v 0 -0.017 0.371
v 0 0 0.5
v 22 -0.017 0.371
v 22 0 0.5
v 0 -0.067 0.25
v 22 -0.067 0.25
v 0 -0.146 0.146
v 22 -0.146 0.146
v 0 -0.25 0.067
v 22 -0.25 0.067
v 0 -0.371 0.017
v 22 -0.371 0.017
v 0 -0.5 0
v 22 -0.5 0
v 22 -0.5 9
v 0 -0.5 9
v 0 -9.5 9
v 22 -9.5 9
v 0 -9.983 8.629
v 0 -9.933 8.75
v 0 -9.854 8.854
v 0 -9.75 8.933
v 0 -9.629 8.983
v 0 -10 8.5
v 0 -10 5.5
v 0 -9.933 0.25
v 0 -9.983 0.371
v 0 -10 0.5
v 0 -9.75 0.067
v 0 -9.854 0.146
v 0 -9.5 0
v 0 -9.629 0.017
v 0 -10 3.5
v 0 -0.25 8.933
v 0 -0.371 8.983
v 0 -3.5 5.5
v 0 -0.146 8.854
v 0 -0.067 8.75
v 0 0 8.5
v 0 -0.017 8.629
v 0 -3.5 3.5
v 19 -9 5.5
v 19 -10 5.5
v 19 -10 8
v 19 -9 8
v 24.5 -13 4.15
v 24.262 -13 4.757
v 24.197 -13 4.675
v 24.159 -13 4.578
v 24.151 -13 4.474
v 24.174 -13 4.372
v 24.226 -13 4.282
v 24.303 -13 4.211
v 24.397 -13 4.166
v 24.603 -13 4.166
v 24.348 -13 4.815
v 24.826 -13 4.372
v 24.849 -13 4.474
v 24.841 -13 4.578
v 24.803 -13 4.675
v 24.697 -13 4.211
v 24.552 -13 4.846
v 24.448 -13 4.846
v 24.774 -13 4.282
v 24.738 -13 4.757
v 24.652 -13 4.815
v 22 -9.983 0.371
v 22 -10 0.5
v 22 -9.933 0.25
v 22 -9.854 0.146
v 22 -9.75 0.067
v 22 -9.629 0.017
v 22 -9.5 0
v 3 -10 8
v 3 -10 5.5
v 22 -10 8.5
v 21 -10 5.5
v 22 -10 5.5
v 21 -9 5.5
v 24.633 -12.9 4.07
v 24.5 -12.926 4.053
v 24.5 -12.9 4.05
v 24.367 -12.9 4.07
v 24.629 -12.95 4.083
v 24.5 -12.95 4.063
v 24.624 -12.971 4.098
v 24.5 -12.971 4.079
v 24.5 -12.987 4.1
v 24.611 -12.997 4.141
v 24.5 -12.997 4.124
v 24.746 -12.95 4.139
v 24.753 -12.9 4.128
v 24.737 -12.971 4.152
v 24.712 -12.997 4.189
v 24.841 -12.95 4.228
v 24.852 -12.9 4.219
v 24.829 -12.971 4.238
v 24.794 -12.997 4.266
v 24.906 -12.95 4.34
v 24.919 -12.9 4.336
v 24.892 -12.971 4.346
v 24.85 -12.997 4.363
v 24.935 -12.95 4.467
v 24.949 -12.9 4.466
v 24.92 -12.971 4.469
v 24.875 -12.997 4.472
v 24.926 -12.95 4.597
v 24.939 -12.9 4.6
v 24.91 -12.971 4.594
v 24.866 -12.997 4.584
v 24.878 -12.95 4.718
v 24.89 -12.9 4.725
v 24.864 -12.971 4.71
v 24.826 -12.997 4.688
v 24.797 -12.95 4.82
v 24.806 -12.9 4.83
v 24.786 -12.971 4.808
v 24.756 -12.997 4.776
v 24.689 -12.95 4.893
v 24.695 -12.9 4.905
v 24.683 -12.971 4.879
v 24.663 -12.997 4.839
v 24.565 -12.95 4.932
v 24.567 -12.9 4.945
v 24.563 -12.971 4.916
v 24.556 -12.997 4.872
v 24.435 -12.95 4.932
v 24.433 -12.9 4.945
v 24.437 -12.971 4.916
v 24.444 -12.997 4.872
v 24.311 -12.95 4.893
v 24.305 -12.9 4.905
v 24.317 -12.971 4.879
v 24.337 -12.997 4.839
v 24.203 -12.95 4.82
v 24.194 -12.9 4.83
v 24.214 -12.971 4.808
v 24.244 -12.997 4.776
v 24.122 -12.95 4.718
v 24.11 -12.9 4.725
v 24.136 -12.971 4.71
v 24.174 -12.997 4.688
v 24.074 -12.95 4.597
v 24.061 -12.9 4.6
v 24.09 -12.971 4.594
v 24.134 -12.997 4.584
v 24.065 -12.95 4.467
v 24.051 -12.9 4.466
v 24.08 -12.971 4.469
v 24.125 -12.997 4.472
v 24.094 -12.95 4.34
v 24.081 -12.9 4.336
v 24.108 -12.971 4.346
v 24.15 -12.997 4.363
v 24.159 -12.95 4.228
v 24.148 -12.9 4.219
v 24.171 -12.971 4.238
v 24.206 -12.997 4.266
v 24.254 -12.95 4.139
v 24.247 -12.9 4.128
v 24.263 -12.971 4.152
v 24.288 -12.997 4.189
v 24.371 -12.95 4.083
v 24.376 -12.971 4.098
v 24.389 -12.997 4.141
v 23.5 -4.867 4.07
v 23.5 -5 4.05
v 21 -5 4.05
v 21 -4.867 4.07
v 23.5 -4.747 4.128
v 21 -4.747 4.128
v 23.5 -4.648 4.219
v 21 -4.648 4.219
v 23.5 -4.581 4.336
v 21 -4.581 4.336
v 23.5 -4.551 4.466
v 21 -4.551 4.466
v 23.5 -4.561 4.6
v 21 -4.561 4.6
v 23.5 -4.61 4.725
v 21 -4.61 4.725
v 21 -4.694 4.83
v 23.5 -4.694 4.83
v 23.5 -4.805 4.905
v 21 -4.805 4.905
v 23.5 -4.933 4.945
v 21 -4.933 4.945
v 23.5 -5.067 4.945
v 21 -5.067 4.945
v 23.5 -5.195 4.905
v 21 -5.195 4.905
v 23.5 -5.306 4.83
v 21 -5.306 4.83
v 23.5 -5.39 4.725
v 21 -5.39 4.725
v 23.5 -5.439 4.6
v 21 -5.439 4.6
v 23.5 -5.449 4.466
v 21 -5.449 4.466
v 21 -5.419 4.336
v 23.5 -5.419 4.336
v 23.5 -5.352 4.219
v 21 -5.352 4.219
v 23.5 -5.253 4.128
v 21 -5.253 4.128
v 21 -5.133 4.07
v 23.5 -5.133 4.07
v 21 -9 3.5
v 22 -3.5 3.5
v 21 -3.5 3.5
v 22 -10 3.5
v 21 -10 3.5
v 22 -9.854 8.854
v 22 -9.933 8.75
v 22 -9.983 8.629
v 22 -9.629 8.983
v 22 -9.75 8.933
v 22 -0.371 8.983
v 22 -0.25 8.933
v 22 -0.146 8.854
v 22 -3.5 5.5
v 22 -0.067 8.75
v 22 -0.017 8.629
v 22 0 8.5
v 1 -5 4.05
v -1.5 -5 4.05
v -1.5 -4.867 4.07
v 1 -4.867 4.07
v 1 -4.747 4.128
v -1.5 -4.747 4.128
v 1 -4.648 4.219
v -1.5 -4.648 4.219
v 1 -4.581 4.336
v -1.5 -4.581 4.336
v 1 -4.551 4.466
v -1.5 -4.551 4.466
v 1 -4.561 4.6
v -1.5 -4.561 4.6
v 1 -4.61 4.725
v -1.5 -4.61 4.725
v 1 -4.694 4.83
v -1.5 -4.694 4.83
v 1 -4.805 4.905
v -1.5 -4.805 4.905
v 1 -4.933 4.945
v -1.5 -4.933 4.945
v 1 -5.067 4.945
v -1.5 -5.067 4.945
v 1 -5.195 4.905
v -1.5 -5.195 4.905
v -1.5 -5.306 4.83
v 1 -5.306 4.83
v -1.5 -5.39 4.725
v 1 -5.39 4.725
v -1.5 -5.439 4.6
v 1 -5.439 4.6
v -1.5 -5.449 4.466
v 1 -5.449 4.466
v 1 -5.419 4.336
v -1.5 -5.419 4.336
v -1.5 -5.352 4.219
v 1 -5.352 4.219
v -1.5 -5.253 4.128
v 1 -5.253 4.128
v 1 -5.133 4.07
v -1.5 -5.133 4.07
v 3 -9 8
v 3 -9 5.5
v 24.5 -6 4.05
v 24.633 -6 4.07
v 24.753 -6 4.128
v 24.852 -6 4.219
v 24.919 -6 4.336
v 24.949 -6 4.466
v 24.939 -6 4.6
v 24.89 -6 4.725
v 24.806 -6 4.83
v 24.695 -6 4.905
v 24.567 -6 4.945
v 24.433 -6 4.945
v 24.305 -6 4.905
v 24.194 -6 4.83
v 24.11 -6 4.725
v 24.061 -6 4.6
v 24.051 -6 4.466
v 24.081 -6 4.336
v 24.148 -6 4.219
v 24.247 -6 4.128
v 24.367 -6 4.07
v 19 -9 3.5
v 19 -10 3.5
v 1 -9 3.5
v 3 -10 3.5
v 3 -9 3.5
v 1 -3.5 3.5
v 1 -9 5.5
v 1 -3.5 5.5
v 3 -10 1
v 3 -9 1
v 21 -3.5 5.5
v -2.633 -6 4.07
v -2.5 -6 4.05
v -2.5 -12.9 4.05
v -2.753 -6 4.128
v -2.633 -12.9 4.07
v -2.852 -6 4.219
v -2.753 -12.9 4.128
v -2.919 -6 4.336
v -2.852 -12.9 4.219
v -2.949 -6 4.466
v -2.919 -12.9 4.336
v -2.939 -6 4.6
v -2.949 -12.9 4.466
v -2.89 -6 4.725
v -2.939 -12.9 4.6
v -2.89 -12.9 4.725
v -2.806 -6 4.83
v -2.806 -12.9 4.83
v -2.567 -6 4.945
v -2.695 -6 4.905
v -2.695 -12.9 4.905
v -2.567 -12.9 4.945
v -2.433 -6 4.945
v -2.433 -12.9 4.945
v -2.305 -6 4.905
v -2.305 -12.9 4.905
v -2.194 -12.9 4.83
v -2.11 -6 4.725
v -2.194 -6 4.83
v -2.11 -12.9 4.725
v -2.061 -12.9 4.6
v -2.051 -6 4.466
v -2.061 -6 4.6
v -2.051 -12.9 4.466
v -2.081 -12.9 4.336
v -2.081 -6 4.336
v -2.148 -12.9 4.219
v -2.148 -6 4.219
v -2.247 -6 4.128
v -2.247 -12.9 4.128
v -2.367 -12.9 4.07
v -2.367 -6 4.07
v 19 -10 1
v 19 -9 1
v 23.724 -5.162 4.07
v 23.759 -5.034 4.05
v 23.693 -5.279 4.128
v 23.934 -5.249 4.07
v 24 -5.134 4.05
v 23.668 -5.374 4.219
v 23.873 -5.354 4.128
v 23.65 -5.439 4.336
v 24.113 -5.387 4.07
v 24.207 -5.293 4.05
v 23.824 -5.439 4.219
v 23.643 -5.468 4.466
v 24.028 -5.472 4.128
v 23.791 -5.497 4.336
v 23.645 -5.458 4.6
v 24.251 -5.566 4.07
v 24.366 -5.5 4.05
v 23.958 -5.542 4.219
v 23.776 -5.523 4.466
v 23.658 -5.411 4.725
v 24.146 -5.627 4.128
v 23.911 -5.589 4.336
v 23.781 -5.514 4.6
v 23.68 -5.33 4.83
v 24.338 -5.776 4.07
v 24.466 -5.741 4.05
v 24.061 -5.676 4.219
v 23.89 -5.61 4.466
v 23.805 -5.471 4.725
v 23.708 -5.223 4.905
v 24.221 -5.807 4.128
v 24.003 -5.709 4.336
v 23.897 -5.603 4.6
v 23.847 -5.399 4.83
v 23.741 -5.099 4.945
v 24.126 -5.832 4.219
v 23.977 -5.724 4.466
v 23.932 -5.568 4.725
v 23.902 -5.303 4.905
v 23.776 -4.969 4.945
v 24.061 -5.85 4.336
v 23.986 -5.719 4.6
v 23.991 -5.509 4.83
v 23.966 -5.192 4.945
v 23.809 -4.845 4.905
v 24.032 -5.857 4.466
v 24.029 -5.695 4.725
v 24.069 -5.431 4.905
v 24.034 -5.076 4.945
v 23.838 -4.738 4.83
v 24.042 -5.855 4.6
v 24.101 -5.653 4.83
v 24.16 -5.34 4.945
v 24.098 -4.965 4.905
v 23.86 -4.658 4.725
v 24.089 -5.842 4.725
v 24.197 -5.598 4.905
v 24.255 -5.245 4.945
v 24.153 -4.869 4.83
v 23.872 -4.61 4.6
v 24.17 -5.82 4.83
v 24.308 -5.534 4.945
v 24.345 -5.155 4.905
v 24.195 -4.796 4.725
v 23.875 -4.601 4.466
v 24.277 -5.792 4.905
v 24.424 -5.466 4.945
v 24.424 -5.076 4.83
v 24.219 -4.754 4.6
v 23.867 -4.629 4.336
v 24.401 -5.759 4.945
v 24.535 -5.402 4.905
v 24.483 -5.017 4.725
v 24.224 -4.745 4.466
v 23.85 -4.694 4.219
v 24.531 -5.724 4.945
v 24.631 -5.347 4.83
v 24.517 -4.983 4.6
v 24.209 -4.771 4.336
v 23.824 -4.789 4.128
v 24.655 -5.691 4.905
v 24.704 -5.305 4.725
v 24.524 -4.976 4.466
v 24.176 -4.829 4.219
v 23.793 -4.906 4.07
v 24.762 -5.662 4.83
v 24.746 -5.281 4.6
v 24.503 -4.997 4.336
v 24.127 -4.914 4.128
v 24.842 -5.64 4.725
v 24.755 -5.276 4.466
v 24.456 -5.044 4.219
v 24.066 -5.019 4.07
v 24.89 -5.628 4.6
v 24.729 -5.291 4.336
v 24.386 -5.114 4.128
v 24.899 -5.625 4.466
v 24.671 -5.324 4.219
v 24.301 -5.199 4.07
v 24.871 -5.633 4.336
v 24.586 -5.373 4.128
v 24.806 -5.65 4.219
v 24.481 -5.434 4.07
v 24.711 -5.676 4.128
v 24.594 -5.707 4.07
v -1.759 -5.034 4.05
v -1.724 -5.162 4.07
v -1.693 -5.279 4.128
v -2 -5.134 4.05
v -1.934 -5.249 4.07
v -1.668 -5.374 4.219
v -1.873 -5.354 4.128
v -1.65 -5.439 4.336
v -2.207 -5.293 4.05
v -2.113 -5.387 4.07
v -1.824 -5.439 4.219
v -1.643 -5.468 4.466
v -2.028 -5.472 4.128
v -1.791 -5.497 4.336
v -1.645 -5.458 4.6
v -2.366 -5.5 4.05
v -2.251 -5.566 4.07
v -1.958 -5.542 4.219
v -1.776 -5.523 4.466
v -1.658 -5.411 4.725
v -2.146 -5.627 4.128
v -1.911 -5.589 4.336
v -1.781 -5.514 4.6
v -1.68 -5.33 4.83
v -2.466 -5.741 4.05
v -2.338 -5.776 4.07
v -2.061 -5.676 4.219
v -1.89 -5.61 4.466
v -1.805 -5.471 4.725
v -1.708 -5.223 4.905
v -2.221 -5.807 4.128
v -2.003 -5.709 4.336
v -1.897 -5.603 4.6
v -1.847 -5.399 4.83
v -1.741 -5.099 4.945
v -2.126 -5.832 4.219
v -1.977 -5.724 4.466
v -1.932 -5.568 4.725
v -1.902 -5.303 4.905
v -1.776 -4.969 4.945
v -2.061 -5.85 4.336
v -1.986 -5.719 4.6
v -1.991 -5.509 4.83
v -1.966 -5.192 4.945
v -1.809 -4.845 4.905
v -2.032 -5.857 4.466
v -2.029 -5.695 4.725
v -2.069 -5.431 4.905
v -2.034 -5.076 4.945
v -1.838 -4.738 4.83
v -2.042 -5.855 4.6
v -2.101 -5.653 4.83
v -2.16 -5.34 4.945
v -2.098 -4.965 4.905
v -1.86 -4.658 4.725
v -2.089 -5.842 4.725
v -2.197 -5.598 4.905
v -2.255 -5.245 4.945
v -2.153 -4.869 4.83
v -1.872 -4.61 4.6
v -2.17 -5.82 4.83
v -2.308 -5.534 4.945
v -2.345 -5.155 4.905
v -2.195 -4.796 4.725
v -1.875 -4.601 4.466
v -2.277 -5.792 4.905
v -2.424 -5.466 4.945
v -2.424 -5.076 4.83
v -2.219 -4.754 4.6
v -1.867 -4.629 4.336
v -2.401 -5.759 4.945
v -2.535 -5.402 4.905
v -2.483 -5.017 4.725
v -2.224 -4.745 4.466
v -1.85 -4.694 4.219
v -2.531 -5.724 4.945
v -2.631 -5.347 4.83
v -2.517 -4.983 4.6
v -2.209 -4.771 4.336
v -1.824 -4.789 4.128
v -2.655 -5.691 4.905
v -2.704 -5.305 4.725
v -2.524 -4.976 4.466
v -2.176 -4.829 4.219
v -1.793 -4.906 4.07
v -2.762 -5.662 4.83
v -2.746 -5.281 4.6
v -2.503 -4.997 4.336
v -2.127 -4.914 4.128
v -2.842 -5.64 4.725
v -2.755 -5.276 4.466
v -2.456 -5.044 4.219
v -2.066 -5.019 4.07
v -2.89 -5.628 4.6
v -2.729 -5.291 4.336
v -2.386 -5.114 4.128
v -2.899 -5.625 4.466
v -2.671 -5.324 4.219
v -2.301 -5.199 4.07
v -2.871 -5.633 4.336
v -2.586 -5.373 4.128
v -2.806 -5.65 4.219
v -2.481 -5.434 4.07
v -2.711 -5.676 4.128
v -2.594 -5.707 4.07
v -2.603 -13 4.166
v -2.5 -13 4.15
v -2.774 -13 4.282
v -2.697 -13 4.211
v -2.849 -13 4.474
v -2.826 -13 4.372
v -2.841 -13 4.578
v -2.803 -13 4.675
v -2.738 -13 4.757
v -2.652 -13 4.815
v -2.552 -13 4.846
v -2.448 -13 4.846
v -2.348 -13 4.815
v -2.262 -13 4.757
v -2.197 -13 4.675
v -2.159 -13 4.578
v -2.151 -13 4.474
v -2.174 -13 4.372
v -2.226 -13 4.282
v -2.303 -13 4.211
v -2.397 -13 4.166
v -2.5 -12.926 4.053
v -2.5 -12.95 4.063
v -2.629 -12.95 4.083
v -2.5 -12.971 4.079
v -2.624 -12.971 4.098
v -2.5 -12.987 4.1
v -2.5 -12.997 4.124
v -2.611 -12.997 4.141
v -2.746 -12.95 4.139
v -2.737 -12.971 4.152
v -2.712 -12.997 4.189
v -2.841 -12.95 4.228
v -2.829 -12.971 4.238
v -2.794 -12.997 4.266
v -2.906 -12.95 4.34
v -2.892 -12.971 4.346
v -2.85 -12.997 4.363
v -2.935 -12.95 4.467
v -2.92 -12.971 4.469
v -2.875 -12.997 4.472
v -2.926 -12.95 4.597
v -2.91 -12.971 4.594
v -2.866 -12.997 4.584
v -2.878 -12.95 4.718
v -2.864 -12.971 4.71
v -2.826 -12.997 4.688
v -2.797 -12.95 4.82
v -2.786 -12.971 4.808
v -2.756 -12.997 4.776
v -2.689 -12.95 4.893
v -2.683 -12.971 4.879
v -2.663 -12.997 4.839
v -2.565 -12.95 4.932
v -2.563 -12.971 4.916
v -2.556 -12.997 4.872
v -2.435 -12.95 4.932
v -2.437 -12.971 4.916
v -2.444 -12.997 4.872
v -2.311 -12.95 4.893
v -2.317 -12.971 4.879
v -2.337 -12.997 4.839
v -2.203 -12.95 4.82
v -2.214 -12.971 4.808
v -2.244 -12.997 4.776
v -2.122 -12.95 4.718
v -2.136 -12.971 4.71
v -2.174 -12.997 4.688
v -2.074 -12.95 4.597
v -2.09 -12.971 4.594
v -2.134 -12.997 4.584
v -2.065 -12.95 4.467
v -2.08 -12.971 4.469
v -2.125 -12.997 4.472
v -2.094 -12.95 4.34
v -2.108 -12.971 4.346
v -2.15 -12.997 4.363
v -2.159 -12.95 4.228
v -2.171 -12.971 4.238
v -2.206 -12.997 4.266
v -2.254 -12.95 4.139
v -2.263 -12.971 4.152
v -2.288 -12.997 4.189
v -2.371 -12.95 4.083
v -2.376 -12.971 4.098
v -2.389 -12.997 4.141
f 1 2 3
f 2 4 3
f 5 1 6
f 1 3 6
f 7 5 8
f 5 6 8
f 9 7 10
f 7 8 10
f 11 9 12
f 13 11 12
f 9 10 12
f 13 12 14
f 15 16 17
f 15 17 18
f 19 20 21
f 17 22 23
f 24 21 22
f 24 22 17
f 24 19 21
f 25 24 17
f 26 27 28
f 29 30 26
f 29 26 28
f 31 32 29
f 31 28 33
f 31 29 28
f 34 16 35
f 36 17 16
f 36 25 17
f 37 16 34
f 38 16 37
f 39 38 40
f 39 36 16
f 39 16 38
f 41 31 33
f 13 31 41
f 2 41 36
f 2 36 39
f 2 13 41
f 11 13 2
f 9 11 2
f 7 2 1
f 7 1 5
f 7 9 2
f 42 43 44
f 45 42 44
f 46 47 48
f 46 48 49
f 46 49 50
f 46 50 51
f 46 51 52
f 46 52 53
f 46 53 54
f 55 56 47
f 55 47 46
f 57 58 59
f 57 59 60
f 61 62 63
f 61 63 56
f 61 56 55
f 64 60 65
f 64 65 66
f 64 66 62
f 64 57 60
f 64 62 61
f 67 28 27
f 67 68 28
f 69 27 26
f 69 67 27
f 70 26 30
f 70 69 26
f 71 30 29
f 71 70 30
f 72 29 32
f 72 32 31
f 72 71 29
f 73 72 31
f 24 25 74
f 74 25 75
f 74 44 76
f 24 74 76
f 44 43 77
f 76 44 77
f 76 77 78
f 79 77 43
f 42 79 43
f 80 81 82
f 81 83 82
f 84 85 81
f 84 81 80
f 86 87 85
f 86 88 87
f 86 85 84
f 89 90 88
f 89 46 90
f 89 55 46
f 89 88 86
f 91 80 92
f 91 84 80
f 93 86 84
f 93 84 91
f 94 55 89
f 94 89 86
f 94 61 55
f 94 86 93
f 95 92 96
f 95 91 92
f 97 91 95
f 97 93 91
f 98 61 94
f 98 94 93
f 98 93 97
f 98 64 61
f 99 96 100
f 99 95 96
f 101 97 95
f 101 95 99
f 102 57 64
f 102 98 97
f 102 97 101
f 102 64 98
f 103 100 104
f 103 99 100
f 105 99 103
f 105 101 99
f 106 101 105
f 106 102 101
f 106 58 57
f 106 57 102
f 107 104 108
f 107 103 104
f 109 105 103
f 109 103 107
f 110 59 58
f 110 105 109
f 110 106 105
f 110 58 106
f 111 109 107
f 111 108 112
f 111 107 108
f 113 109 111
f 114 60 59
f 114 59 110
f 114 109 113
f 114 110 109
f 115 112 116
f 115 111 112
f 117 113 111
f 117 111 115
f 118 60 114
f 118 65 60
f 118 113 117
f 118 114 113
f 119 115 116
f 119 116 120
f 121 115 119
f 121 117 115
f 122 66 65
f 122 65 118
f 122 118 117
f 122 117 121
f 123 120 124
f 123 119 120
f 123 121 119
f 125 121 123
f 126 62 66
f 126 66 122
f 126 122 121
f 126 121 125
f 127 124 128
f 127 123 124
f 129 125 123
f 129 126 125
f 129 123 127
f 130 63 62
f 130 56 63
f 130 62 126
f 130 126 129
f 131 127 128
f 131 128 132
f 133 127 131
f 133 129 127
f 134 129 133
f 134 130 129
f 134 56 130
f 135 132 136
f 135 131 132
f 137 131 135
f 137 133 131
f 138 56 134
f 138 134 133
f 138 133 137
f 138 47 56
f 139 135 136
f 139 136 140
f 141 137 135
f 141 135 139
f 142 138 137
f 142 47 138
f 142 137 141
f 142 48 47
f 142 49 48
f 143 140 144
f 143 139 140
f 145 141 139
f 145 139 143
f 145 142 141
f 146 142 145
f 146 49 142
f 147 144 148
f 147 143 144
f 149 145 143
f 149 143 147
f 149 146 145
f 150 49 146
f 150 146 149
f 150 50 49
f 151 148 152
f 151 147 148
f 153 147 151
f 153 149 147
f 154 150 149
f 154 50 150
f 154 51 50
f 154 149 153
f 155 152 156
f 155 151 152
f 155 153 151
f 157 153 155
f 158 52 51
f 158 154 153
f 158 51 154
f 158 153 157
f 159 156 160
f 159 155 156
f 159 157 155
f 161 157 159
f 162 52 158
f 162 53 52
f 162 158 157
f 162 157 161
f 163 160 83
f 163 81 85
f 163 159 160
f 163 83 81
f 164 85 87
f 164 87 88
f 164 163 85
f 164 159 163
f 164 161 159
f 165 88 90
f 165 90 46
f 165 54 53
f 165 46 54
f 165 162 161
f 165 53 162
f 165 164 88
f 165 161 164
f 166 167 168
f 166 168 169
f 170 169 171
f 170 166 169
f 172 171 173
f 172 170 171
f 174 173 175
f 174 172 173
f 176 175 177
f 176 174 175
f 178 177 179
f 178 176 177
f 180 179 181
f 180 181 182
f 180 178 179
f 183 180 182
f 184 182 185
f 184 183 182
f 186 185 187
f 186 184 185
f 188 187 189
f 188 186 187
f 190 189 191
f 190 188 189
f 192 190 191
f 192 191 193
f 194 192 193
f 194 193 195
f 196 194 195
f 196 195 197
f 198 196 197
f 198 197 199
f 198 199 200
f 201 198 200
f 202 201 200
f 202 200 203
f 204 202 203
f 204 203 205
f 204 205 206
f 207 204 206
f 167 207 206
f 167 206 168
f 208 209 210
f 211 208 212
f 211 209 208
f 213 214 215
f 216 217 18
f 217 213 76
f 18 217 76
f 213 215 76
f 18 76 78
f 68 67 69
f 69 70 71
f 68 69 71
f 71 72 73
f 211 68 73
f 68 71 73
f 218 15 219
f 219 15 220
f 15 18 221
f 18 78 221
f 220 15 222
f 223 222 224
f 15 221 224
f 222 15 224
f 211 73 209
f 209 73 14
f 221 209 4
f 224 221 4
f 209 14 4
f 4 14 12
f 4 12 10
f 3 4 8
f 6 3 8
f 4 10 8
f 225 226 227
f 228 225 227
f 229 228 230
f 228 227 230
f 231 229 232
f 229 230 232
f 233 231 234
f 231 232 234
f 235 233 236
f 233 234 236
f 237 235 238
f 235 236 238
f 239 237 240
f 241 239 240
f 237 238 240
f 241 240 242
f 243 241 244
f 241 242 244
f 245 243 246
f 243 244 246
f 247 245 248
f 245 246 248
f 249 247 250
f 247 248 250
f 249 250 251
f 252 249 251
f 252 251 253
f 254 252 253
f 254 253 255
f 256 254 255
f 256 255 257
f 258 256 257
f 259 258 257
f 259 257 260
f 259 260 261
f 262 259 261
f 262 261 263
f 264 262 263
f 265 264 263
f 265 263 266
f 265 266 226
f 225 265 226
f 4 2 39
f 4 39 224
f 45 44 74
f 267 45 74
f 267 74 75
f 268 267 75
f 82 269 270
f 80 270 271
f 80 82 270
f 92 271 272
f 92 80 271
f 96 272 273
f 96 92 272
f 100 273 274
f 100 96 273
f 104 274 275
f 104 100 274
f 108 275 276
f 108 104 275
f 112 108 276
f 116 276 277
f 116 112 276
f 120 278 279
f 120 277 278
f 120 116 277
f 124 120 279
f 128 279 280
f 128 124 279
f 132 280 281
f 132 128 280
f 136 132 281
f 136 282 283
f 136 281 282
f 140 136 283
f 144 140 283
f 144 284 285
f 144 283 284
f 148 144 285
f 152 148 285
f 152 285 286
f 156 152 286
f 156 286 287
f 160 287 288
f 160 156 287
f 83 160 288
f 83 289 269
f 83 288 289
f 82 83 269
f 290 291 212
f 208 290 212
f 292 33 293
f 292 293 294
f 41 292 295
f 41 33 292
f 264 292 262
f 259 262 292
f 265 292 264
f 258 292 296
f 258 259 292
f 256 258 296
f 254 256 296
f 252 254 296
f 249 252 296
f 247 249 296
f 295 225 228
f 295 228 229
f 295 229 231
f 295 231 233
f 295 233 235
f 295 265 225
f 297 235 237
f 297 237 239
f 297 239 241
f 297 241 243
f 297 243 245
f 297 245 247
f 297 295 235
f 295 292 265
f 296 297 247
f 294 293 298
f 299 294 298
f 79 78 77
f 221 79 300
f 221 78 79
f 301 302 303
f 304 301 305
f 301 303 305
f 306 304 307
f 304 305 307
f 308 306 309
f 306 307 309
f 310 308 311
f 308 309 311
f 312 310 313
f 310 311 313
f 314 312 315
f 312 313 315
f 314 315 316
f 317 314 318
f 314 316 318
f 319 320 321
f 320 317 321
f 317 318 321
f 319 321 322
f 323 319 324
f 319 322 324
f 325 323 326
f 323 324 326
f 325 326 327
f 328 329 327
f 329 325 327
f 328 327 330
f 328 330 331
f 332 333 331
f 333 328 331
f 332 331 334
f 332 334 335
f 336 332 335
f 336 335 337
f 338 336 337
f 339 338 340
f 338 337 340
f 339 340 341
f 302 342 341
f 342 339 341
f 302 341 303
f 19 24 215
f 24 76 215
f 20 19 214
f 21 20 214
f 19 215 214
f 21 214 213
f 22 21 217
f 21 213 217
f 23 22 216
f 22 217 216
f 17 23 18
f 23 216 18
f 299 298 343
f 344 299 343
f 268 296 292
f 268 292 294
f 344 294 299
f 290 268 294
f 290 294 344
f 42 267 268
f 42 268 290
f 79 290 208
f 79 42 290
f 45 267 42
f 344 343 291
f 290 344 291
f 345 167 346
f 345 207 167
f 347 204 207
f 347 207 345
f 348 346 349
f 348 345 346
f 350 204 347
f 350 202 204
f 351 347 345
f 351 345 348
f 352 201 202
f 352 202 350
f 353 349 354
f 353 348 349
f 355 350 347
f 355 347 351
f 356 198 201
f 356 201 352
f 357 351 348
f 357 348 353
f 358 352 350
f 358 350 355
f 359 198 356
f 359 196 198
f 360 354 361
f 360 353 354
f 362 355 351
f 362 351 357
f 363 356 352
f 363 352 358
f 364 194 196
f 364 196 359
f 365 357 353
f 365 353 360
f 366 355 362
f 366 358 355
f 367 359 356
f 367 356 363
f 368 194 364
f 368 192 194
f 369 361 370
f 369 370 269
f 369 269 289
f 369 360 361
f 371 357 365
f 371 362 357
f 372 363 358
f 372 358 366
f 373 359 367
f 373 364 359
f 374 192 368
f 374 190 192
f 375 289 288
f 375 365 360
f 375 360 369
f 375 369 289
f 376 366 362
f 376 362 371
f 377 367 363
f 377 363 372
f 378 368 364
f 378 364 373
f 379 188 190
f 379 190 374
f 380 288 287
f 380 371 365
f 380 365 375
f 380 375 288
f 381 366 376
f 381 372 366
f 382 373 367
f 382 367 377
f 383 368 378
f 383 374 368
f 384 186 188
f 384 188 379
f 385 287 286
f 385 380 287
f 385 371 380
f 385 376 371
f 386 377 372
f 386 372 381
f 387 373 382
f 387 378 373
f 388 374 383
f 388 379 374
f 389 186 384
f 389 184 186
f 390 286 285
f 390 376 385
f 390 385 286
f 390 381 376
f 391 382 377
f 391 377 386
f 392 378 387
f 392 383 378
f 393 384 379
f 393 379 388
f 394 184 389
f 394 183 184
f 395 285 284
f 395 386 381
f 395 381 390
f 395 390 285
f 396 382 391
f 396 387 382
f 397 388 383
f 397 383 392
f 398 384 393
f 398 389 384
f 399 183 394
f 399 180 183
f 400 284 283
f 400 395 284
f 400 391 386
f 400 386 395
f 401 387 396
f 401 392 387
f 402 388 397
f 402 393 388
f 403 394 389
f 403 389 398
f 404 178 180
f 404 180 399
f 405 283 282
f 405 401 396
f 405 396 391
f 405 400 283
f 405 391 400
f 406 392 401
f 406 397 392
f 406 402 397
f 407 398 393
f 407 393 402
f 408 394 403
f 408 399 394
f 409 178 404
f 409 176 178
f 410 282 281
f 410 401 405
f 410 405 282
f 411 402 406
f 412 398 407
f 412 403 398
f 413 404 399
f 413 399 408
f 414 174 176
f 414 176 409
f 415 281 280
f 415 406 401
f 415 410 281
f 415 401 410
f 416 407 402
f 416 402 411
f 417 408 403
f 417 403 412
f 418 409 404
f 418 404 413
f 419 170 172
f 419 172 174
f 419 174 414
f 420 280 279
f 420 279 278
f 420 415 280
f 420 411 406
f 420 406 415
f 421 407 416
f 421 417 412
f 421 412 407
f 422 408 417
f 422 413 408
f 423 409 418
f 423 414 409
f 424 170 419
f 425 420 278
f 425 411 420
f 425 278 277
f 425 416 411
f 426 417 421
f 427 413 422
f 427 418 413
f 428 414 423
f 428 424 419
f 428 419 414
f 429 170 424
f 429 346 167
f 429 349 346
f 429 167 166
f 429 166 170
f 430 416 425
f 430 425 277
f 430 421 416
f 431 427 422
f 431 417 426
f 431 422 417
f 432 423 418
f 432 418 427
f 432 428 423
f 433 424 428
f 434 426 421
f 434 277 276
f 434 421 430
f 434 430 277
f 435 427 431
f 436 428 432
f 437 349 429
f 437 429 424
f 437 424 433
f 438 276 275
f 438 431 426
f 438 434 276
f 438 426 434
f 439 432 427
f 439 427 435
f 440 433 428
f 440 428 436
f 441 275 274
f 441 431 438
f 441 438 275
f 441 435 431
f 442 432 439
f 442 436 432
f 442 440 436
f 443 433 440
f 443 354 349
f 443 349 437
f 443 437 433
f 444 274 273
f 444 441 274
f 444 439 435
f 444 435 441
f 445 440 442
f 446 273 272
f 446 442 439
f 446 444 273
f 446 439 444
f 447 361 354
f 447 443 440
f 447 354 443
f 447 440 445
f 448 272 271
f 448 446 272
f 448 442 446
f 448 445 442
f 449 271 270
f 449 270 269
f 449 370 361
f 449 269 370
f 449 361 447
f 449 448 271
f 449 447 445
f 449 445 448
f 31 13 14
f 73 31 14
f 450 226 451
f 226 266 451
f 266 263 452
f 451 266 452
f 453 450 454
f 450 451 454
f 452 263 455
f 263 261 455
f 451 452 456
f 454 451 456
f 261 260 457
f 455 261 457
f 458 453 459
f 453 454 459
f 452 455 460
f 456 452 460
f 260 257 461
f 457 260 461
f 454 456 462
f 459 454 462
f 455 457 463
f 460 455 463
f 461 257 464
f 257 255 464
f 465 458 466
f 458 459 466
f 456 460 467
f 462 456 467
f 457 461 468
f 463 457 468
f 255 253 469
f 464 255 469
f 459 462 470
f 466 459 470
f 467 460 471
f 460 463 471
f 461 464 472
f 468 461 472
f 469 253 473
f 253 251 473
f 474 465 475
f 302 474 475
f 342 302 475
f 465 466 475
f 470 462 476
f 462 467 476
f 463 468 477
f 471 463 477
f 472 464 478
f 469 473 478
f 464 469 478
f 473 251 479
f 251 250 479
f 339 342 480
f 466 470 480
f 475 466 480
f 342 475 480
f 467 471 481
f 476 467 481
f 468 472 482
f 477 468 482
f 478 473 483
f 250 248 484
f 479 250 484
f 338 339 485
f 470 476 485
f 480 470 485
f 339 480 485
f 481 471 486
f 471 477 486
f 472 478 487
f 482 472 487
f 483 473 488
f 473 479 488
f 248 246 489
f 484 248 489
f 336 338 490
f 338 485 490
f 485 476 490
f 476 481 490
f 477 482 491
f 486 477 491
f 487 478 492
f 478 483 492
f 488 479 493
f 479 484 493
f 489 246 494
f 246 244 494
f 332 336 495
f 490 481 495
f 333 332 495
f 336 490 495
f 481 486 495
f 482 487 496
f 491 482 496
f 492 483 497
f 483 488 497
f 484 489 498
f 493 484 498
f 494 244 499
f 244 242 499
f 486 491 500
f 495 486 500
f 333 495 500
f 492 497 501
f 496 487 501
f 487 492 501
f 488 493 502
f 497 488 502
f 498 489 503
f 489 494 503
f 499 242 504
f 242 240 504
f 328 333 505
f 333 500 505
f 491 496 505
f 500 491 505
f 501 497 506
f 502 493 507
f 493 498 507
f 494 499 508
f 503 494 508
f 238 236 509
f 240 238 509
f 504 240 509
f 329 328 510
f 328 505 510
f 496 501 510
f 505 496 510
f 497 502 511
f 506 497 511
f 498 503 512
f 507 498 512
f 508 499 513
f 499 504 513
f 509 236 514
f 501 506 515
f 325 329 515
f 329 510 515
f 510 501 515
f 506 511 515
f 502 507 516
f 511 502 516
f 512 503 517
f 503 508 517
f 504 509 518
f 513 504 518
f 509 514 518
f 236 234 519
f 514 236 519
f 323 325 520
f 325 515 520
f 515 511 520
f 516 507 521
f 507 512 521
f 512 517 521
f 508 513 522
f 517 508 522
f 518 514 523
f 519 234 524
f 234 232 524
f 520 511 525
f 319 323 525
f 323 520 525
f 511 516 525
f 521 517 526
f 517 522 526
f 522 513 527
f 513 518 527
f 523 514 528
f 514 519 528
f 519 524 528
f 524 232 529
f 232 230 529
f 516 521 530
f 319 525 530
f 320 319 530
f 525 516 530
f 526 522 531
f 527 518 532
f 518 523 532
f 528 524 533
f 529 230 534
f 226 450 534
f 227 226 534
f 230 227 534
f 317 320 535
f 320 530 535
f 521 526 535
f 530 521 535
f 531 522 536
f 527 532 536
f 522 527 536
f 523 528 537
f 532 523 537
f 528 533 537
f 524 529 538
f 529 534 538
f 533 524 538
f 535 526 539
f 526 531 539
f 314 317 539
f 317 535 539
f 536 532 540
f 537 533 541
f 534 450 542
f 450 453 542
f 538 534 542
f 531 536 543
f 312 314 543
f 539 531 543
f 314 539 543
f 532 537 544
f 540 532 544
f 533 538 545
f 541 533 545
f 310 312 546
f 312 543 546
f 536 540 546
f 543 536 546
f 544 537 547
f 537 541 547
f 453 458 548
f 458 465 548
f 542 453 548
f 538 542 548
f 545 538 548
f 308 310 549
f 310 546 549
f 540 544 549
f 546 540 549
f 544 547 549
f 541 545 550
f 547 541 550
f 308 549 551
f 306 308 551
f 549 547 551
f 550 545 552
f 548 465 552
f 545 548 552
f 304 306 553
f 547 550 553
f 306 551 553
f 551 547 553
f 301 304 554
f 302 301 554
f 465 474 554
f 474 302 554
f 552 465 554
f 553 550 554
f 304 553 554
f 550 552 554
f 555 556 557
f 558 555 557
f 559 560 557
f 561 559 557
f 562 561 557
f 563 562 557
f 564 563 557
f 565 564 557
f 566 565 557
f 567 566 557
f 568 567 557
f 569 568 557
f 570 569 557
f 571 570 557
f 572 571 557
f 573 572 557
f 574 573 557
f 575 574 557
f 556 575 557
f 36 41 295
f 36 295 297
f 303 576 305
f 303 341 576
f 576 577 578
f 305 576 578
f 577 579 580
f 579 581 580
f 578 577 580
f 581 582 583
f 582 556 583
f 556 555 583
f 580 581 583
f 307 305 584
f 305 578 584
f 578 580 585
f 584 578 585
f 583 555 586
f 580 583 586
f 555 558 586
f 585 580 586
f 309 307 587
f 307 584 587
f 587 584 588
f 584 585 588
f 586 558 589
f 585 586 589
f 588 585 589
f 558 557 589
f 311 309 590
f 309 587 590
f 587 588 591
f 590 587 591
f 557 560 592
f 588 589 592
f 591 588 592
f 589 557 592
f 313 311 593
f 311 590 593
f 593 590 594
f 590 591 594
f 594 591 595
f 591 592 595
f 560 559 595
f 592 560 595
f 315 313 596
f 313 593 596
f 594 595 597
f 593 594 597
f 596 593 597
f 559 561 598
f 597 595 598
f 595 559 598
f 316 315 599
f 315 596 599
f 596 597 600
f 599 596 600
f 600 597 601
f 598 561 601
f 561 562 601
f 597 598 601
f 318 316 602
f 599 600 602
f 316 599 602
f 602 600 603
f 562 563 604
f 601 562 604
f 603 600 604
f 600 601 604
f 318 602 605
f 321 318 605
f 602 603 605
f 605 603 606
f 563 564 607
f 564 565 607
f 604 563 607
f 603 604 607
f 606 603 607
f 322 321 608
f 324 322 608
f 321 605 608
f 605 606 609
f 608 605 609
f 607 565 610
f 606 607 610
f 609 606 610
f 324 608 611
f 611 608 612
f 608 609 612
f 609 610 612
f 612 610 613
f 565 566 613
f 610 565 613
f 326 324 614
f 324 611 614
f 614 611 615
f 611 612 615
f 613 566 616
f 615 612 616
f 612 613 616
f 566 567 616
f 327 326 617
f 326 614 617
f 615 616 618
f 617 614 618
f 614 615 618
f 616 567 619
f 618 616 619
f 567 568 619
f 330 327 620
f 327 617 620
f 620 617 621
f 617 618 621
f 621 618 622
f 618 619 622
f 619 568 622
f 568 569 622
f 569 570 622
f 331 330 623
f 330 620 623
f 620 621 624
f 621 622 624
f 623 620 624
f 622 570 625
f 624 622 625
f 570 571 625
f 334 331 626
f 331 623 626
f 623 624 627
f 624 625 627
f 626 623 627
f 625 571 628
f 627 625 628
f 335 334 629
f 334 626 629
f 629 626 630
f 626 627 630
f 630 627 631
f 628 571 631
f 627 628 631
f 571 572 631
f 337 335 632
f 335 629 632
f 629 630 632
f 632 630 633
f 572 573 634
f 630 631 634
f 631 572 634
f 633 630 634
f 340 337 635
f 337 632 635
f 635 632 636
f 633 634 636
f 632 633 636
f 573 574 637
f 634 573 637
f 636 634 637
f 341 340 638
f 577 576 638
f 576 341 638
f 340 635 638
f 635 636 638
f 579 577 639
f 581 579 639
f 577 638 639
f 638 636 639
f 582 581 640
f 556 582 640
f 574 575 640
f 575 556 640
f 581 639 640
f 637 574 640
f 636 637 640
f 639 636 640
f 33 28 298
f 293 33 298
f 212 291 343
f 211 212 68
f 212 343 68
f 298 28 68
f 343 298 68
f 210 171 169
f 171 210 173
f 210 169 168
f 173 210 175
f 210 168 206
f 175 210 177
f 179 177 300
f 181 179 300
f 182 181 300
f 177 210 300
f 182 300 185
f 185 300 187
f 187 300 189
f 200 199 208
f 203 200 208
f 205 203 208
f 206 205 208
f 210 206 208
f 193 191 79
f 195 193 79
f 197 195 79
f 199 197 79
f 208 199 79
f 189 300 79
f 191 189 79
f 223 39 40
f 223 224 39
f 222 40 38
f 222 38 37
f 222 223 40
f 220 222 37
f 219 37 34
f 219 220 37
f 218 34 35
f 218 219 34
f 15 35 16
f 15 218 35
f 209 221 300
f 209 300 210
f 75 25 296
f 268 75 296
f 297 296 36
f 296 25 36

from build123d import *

# Parameters (mm, degrees)
SKETCH1_W           = 22
SKETCH1_H           = 10
BOSS_EXTRUDE1_DEPTH = 9
FILLET2_R           = 0.5
CUT_EXTRUDE4_DEPTH  = 1
SKETCH8_W           = 2
SKETCH8_H           = 6.5
CUT_EXTRUDE5_DEPTH  = 1
CUT_EXTRUDE6_DEPTH  = 1
SKETCH13_R          = 0.45
FILLET3_R           = 0.1


with BuildPart() as part:
    # Sketch1 → Boss-Extrude1 (new body)
    with BuildSketch(Plane.XY):
        with Locations((11, -5)):
            Rectangle(SKETCH1_W, SKETCH1_H)
    extrude(amount=BOSS_EXTRUDE1_DEPTH)

    # Fillet2
    fillet2_edges = [part.edges().sort_by_distance(p)[0] for p in [
        (11, 0, 9),
        (11, 0, 0),
        (11, -10, 0),
        (11, -10, 9),
    ]]
    fillet(fillet2_edges, radius=FILLET2_R)

    # 3DSketch1 → Cut-Extrude4 (cut)
    with BuildSketch(Plane(origin=(22, -10, 5.5), x_dir=(0, 0.9557790087219501, -0.29408584883752314), z_dir=(1, 0, 0))):
        Polygon((0, 0), (6.212563557, 1.911558017), (6.800735254, 0), (0.588171698, -1.911558017), align=None)
    extrude(amount=-CUT_EXTRUDE4_DEPTH, mode=Mode.SUBTRACT)

    # Sketch8 → Cut-Extrude5 (cut)
    with BuildSketch(Plane.ZY):
        with Locations((4.5, -6.75)):
            Rectangle(SKETCH8_W, SKETCH8_H)
    extrude(amount=-CUT_EXTRUDE5_DEPTH, mode=Mode.SUBTRACT)

    # Sketch6 → Cut-Extrude6 (cut)
    with BuildSketch(Plane.XZ.offset(10)):
        Polygon((1, 5.5), (1, 3.5), (3, 3.5), (3, 1), (19, 1), (19, 3.5), (21, 3.5), (21, 5.5), (19, 5.5), (19, 8), (3, 8), (3, 5.5), align=None)
    extrude(amount=-CUT_EXTRUDE6_DEPTH, mode=Mode.SUBTRACT)

    # Sweep1: sweep along a curve in space
    with BuildLine() as sweep1_path:
        Line((21, -5, 4.5), (23.5, -5, 4.5))
        ThreePointArc((24.5, -6, 4.5), (24.207106781, -5.292893219, 4.5), (23.5, -5, 4.5))
        Line((24.5, -6, 4.5), (24.5, -13, 4.5))
    # Sketch13 → Sweep1 (sweep)
    with BuildSketch(Plane(origin=(21, 0, 0), x_dir=(0, 0, -1), z_dir=(1, 0, 0))):
        with Locations((-4.5, -5)):
            Circle(SKETCH13_R)
    sweep1 = sweep(path=sweep1_path.line)

    # Mirror1: Sweep1 across plane
    add(sweep1.mirror(Plane(origin=(11, 0, 0), x_dir=(0, 0, 1), z_dir=(1, 0, 0))))

    # Fillet3
    fillet3_edges = [part.edges().sort_by_distance(p)[0] for p in [
        (24.5, -13, 4.95),
        (-2.5, -13, 4.95),
    ]]
    fillet(fillet3_edges, radius=FILLET3_R)


solid = part.part
